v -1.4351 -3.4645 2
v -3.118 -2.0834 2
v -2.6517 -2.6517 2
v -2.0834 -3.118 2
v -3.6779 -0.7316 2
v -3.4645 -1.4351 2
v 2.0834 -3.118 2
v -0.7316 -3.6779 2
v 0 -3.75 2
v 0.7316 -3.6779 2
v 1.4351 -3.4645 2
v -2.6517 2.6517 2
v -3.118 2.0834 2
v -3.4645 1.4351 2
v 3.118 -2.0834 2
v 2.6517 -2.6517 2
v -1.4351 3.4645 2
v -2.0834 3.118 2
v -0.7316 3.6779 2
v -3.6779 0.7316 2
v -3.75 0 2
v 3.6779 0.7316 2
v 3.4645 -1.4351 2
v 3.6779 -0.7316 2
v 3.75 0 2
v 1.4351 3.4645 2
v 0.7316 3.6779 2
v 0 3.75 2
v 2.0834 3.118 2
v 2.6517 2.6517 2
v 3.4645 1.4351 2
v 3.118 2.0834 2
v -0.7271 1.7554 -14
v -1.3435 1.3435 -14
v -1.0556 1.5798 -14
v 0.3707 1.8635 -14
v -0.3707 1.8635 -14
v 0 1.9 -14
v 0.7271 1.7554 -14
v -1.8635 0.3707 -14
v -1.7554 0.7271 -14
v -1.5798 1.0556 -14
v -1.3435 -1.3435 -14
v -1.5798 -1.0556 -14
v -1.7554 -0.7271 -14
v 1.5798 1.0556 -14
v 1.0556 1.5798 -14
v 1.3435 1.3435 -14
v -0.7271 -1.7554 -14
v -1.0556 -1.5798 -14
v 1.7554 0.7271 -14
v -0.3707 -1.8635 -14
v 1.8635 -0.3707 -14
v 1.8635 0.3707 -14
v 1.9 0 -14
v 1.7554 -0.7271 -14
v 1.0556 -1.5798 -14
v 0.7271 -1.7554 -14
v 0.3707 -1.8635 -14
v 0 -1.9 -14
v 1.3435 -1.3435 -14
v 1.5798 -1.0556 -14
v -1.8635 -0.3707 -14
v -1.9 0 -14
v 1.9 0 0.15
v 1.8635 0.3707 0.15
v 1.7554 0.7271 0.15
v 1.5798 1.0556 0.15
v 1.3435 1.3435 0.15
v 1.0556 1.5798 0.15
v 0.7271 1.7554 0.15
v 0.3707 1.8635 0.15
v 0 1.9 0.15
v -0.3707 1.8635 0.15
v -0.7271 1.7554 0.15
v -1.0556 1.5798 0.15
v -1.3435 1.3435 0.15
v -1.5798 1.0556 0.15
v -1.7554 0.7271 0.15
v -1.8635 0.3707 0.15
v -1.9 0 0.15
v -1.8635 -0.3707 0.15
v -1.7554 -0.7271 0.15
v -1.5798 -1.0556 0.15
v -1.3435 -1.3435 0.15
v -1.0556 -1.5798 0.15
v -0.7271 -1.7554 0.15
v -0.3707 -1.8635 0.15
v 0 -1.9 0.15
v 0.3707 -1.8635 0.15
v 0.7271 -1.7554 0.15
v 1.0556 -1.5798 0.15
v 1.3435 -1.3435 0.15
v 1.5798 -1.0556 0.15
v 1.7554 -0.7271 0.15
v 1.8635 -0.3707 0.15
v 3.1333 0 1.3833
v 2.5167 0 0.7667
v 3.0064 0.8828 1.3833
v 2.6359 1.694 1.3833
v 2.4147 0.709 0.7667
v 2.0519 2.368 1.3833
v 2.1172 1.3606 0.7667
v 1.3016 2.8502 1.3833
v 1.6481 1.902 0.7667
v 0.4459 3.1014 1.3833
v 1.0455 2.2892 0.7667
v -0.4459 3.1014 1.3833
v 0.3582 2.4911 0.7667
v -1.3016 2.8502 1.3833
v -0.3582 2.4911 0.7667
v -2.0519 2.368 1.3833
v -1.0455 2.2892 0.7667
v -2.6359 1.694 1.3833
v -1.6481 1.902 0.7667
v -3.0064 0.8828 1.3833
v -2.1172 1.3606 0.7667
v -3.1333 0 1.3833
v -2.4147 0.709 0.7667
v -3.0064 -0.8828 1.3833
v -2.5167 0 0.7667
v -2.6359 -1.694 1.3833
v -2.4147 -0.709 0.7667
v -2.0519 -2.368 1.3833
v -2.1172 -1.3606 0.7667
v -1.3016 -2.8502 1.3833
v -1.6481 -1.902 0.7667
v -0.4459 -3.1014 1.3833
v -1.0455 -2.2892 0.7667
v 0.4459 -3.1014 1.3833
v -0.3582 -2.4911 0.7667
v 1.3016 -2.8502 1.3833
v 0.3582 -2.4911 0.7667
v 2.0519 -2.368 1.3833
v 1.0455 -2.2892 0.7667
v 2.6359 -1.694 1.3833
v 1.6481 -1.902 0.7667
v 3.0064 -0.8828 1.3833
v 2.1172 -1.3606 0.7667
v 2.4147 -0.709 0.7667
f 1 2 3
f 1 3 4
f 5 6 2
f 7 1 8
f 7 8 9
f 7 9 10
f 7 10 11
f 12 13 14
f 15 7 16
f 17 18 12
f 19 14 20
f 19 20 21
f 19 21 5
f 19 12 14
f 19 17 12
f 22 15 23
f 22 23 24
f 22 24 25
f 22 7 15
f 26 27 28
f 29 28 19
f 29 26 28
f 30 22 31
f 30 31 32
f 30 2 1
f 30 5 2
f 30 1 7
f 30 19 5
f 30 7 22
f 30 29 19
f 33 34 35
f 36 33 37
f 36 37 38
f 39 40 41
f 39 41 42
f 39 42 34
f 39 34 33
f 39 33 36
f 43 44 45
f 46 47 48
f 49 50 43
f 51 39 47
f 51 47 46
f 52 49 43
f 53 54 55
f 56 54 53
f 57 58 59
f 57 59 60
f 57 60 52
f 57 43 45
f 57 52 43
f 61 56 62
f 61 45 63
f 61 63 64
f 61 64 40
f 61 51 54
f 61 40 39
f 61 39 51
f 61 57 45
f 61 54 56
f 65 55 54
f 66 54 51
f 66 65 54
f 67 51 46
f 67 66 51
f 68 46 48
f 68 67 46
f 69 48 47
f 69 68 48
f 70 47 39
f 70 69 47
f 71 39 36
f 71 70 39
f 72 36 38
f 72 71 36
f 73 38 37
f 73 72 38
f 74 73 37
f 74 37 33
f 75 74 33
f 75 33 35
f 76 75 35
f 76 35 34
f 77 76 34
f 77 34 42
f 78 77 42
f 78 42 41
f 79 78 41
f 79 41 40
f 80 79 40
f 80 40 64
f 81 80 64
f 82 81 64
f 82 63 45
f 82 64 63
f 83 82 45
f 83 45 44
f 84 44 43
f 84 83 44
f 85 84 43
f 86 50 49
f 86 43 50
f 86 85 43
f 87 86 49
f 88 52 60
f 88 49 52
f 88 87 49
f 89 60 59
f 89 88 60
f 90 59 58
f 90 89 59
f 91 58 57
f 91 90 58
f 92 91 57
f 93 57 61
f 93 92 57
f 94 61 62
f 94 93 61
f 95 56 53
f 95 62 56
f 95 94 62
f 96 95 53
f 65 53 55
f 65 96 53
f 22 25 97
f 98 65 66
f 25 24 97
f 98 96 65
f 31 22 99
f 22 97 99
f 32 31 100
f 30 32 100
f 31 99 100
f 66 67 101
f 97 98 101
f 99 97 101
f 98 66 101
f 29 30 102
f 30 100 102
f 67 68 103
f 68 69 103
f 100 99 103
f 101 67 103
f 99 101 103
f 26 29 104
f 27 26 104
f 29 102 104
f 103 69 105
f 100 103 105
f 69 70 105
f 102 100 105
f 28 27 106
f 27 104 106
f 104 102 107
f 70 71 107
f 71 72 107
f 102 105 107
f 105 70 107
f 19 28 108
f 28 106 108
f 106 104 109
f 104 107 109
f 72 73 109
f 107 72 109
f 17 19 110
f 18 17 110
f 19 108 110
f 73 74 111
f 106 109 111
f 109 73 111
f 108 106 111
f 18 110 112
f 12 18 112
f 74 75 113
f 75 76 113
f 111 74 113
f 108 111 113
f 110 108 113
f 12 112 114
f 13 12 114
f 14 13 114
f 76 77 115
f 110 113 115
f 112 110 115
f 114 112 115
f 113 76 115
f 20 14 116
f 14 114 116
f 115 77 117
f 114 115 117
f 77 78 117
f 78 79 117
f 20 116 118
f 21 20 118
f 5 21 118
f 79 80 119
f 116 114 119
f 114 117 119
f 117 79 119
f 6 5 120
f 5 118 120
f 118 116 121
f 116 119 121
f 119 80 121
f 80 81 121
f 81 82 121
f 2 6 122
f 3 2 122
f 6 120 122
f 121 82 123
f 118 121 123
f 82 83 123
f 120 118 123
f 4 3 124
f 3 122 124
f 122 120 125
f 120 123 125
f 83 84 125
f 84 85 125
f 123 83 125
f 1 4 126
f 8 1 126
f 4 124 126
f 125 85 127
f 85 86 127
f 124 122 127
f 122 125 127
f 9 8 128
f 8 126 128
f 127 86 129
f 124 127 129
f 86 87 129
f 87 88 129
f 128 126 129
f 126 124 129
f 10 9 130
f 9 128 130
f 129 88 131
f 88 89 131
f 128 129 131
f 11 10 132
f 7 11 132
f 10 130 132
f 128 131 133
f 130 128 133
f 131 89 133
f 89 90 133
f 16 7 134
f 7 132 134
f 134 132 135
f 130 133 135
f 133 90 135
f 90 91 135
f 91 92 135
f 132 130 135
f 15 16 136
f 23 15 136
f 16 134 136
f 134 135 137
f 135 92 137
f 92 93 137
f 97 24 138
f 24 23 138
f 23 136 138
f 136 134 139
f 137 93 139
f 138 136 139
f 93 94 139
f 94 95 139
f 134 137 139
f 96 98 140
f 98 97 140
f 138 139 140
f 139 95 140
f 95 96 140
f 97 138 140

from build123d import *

# Parameters (mm, degrees)
F0_R        = 3.75
F1_DEPTH    = 2
F2_R        = 1.9
F3_DEPTH    = 14
F4_S5_R     = 1.9
F4_T6_DEPTH = 7


# Not quite as in the source:
# - a fillet or chamfer that OpenCascade refuses, or shapes differently, is made with other operations: its cross-section is extruded or revolved along the edge and cut away or added


with BuildPart() as f1:
    # F0 (on Top) → F1 (new body)
    with BuildSketch(Plane.XY):
        Circle(F0_R)
    extrude(amount=F1_DEPTH)

    # F2 (on face) → F3 (join)
    with BuildSketch(Plane(origin=(0, 0, 0), x_dir=(1, 0, 0), z_dir=(0, 0, -1))):
        Circle(F2_R)
    extrude(amount=F3_DEPTH)

    # F4: chamfer of 2 on 1 edges, made by hand


with BuildPart() as f4_tool2:
    # F4_s3 → F4_t4 (revolve)
    with BuildSketch(Plane.XZ):
        Polygon((3.75, 2), (1.75, 0), (3.75, 0), align=None)
    revolve(axis=Axis((0, 0, 0), (0, 0, 1)))

    # F4_s5 → F4_t6 (cut, symmetric)
    with BuildSketch(Plane.XY.offset(1)):
        Circle(F4_S5_R)
    extrude(amount=F4_T6_DEPTH, both=True, mode=Mode.SUBTRACT)


with BuildPart() as f1_1:
    add(f1.part)

    # F4_t1: cut F4_tool2
    add(f4_tool2.part, mode=Mode.SUBTRACT)


solid = f1_1.part
